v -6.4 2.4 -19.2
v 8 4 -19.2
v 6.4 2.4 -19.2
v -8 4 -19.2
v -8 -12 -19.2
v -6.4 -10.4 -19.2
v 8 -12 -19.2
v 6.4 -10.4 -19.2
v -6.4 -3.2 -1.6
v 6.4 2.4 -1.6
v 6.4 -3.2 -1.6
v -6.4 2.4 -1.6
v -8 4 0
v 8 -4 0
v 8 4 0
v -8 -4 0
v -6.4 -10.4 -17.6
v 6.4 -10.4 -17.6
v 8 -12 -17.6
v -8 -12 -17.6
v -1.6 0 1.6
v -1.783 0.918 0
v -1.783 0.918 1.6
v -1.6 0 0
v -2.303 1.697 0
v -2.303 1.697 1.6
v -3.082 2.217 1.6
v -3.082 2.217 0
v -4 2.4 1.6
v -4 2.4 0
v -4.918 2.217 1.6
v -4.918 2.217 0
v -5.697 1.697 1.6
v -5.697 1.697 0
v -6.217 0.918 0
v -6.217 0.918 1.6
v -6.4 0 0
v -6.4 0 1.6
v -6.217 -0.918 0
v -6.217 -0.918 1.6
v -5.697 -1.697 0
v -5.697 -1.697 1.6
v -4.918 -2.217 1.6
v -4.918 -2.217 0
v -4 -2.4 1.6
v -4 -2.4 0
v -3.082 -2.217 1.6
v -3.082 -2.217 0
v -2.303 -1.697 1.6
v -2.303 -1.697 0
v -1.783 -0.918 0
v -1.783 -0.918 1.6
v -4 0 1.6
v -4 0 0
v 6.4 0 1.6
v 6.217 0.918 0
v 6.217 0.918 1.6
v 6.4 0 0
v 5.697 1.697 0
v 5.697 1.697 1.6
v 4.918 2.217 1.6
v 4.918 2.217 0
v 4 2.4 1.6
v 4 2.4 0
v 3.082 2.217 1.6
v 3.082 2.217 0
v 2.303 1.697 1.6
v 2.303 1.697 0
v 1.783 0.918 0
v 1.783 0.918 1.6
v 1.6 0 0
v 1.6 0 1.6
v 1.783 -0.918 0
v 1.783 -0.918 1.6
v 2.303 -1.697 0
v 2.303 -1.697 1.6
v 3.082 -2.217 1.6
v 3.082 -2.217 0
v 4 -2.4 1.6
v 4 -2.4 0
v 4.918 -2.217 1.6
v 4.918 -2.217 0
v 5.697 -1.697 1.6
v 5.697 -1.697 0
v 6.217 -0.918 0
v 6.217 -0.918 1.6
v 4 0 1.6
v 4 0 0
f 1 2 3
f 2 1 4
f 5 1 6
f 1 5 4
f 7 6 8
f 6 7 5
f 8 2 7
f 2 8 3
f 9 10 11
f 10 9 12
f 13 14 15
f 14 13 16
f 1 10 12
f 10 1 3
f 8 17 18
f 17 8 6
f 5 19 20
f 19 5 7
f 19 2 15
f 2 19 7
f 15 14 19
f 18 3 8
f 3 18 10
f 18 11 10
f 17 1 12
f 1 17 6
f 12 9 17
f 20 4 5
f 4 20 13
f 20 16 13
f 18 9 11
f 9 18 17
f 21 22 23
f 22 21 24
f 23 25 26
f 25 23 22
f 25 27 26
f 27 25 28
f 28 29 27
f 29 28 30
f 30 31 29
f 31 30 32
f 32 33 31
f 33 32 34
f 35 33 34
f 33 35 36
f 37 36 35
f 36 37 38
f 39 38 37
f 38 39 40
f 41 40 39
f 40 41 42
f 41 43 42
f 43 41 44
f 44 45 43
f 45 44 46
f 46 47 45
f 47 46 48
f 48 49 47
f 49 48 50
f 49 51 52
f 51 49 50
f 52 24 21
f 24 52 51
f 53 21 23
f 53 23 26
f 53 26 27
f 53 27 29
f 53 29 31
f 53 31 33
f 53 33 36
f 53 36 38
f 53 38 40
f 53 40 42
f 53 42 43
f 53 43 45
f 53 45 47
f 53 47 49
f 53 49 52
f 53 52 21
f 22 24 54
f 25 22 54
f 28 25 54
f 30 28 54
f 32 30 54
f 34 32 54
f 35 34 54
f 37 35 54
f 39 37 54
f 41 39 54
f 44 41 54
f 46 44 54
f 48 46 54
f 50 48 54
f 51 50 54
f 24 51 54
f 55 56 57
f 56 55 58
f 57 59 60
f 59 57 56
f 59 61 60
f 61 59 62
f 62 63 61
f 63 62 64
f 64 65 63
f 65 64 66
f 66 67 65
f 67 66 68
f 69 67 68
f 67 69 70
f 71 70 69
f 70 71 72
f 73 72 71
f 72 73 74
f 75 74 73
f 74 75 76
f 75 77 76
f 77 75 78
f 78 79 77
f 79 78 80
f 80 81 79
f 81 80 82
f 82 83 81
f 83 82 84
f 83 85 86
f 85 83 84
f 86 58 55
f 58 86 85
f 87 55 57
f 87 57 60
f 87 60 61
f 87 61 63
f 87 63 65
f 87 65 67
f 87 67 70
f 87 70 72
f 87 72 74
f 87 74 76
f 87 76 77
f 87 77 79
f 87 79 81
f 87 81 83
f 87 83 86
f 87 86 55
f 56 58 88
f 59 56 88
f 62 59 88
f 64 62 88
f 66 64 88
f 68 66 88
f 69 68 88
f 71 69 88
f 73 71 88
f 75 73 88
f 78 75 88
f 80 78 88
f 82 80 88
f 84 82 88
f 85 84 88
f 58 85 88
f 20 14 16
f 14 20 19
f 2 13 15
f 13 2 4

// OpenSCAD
// file: ../p/4-4edge.scad
use <../lib.scad>
function ldraw_lib__4_4edge() = [
// 0 Circle 1.0
// 0 Name: 4-4edge.dat
// 0 Author: James Jessiman
// 0 !LDRAW_ORG Primitive UPDATE 2017-01
// 0 !LICENSE Licensed under CC BY 2.0 and CC BY 4.0 : see CAreadme.txt
// 
// 0 BFC CERTIFY CCW
  [0,"BFC","CERTIFY"],
  [0,"BFC","CCW"],
// 
// 0 !HISTORY 1998-12-15 [PTadmin] Official Update 1998-10
// 0 !HISTORY 2005-12-28 [PTadmin] Official Update 2005-01
// 0 !HISTORY 2007-06-24 [PTadmin] Header formatted for Contributor Agreement
// 0 !HISTORY 2008-07-01 [PTadmin] Official Update 2008-01
// 0 !HISTORY 2017-01-15 [Steffen] BFCed
// 0 !HISTORY 2017-12-30 [PTadmin] Official Update 2017-01
// 
// 
// 2 24 1 0 0 0.9239 0 0.3827
  [2,24,1,0,0,0.9239,0,0.3827],
// 2 24 0.9239 0 0.3827 0.7071 0 0.7071
  [2,24,0.9239,0,0.3827,0.7071,0,0.7071],
// 2 24 0.7071 0 0.7071 0.3827 0 0.9239
  [2,24,0.7071,0,0.7071,0.3827,0,0.9239],
// 2 24 0.3827 0 0.9239 0 0 1
  [2,24,0.3827,0,0.9239,0,0,1],
// 2 24 0 0 1 -0.3827 0 0.9239
  [2,24,0,0,1,-0.3827,0,0.9239],
// 2 24 -0.3827 0 0.9239 -0.7071 0 0.7071
  [2,24,-0.3827,0,0.9239,-0.7071,0,0.7071],
// 2 24 -0.7071 0 0.7071 -0.9239 0 0.3827
  [2,24,-0.7071,0,0.7071,-0.9239,0,0.3827],
// 2 24 -0.9239 0 0.3827 -1 0 -0
  [2,24,-0.9239,0,0.3827,-1,0,-0],
// 2 24 -1 0 -0 -0.9239 0 -0.3827
  [2,24,-1,0,-0,-0.9239,0,-0.3827],
// 2 24 -0.9239 0 -0.3827 -0.7071 0 -0.7071
  [2,24,-0.9239,0,-0.3827,-0.7071,0,-0.7071],
// 2 24 -0.7071 0 -0.7071 -0.3827 0 -0.9239
  [2,24,-0.7071,0,-0.7071,-0.3827,0,-0.9239],
// 2 24 -0.3827 0 -0.9239 0 0 -1
  [2,24,-0.3827,0,-0.9239,0,0,-1],
// 2 24 0 0 -1 0.3827 0 -0.9239
  [2,24,0,0,-1,0.3827,0,-0.9239],
// 2 24 0.3827 0 -0.9239 0.7071 0 -0.7071
  [2,24,0.3827,0,-0.9239,0.7071,0,-0.7071],
// 2 24 0.7071 0 -0.7071 0.9239 0 -0.3827
  [2,24,0.7071,0,-0.7071,0.9239,0,-0.3827],
// 2 24 0.9239 0 -0.3827 1 0 0
  [2,24,0.9239,0,-0.3827,1,0,0],
];
module ldraw_lib__4_4edge(step=0, col=false, unit=2/5, alt=false, line=0.2, solid=!$preview)
    makepoly(ldraw_lib__4_4edge(), step=step, col=col, unit=unit, alt=alt, line=line, solid=solid);
ldraw_lib__4_4edge(line=0.2);
// file: ../p/4-4disc.scad
use <../lib.scad>
function ldraw_lib__4_4disc() = [
// 0 Disc 1.0
// 0 Name: 4-4disc.dat
// 0 Author: James Jessiman
// 0 !LDRAW_ORG Primitive UPDATE 2002-02
// 0 !LICENSE Licensed under CC BY 2.0 and CC BY 4.0 : see CAreadme.txt
// 
// 0 BFC CERTIFY CCW
  [0,"BFC","CERTIFY"],
  [0,"BFC","CCW"],
// 
// 0 !HISTORY 1998-12-15 [PTadmin] Official Update 1998-10
// 0 !HISTORY 2002-03-23 [sbliss] Added BFC statement
// 0 !HISTORY 2002-04-25 [PTadmin] Official Update 2002-02
// 0 !HISTORY 2007-06-24 [PTadmin] Header formatted for Contributor Agreement
// 0 !HISTORY 2008-07-01 [PTadmin] Official Update 2008-01
// 
// 
// 3 16 0 0 0 1 0 0 0.9239 0 0.3827
  [3,16,0,0,0,1,0,0,0.9239,0,0.3827],
// 3 16 0 0 0 0.9239 0 0.3827 0.7071 0 0.7071
  [3,16,0,0,0,0.9239,0,0.3827,0.7071,0,0.7071],
// 3 16 0 0 0 0.7071 0 0.7071 0.3827 0 0.9239
  [3,16,0,0,0,0.7071,0,0.7071,0.3827,0,0.9239],
// 3 16 0 0 0 0.3827 0 0.9239 0 0 1
  [3,16,0,0,0,0.3827,0,0.9239,0,0,1],
// 3 16 0 0 0 0 0 1 -0.3827 0 0.9239
  [3,16,0,0,0,0,0,1,-0.3827,0,0.9239],
// 3 16 0 0 0 -0.3827 0 0.9239 -0.7071 0 0.7071
  [3,16,0,0,0,-0.3827,0,0.9239,-0.7071,0,0.7071],
// 3 16 0 0 0 -0.7071 0 0.7071 -0.9239 0 0.3827
  [3,16,0,0,0,-0.7071,0,0.7071,-0.9239,0,0.3827],
// 3 16 0 0 0 -0.9239 0 0.3827 -1 0 -0
  [3,16,0,0,0,-0.9239,0,0.3827,-1,0,-0],
// 3 16 0 0 0 -1 0 -0 -0.9239 0 -0.3827
  [3,16,0,0,0,-1,0,-0,-0.9239,0,-0.3827],
// 3 16 0 0 0 -0.9239 0 -0.3827 -0.7071 0 -0.7071
  [3,16,0,0,0,-0.9239,0,-0.3827,-0.7071,0,-0.7071],
// 3 16 0 0 0 -0.7071 0 -0.7071 -0.3827 0 -0.9239
  [3,16,0,0,0,-0.7071,0,-0.7071,-0.3827,0,-0.9239],
// 3 16 0 0 0 -0.3827 0 -0.9239 0 0 -1
  [3,16,0,0,0,-0.3827,0,-0.9239,0,0,-1],
// 3 16 0 0 0 0 0 -1 0.3827 0 -0.9239
  [3,16,0,0,0,0,0,-1,0.3827,0,-0.9239],
// 3 16 0 0 0 0.3827 0 -0.9239 0.7071 0 -0.7071
  [3,16,0,0,0,0.3827,0,-0.9239,0.7071,0,-0.7071],
// 3 16 0 0 0 0.7071 0 -0.7071 0.9239 0 -0.3827
  [3,16,0,0,0,0.7071,0,-0.7071,0.9239,0,-0.3827],
// 3 16 0 0 0 0.9239 0 -0.3827 1 0 0
  [3,16,0,0,0,0.9239,0,-0.3827,1,0,0],
// 0
];
module ldraw_lib__4_4disc(step=0, col=false, unit=2/5, alt=false, line=0.2, solid=!$preview)
    makepoly(ldraw_lib__4_4disc(), step=step, col=col, unit=unit, alt=alt, line=line, solid=solid);
ldraw_lib__4_4disc(line=0.2);
// file: ../p/4-4cyli.scad
use <../lib.scad>
$fa=1; $fs=0.2;
function ldraw_lib__4_4cyli(realsolid=false) = [
// 0 Cylinder 1.0
// 0 Name: 4-4cyli.dat
// 0 Author: James Jessiman
// 0 !LDRAW_ORG Primitive UPDATE 2005-01
// 0 !LICENSE Licensed under CC BY 2.0 and CC BY 4.0 : see CAreadme.txt
// 
// 0 BFC CERTIFY CCW
  [0,"BFC","CERTIFY"],
  [0,"BFC","CCW"],
// 
// 0 !HISTORY 1998-12-15 [PTadmin] Official Update 1998-10
// 0 !HISTORY 2002-03-23 [sbliss] Added BFC statement; merged headers from files in distributions LDraw 0.27 and Complete.
// 0 !HISTORY 2002-04-25 [PTadmin] Official Update 2002-02
// 0 !HISTORY 2004-12-14 [guyvivan] BFC CCW
// 0 !HISTORY 2005-12-28 [PTadmin] Official Update 2005-01
// 0 !HISTORY 2007-06-24 [PTadmin] Header formatted for Contributor Agreement
// 0 !HISTORY 2008-07-01 [PTadmin] Official Update 2008-01
// 
// 
// 4 16 1 1 0 0.9239 1 0.3827 0.9239 0 0.3827 1 0 0
  [4,16,1,1,0,0.9239,1,0.3827,0.9239,0,0.3827,1,0,0],
// 5 24 1 0 0 1 1 0 0.9239 0 0.3827 0.9239 0 -0.3827
  [5,24,1,0,0,1,1,0,0.9239,0,0.3827,0.9239,0,-0.3827],
// 4 16 0.9239 1 0.3827 0.7071 1 0.7071 0.7071 0 0.7071 0.9239 0 0.3827
  [4,16,0.9239,1,0.3827,0.7071,1,0.7071,0.7071,0,0.7071,0.9239,0,0.3827],
// 5 24 0.9239 0 0.3827 0.9239 1 0.3827 0.7071 0 0.7071 1 0 0
  [5,24,0.9239,0,0.3827,0.9239,1,0.3827,0.7071,0,0.7071,1,0,0],
// 4 16 0.7071 1 0.7071 0.3827 1 0.9239 0.3827 0 0.9239 0.7071 0 0.7071
  [4,16,0.7071,1,0.7071,0.3827,1,0.9239,0.3827,0,0.9239,0.7071,0,0.7071],
// 5 24 0.7071 0 0.7071 0.7071 1 0.7071 0.3827 0 0.9239 0.9239 0 0.3827
  [5,24,0.7071,0,0.7071,0.7071,1,0.7071,0.3827,0,0.9239,0.9239,0,0.3827],
// 4 16 0.3827 1 0.9239 0 1 1 0 0 1 0.3827 0 0.9239
  [4,16,0.3827,1,0.9239,0,1,1,0,0,1,0.3827,0,0.9239],
// 5 24 0.3827 0 0.9239 0.3827 1 0.9239 0 0 1 0.7071 0 0.7071
  [5,24,0.3827,0,0.9239,0.3827,1,0.9239,0,0,1,0.7071,0,0.7071],
// 4 16 0 1 1 -0.3827 1 0.9239 -0.3827 0 0.9239 0 0 1
  [4,16,0,1,1,-0.3827,1,0.9239,-0.3827,0,0.9239,0,0,1],
// 5 24 0 0 1 0 1 1 -0.3827 0 0.9239 0.3827 0 0.9239
  [5,24,0,0,1,0,1,1,-0.3827,0,0.9239,0.3827,0,0.9239],
// 4 16 -0.3827 1 0.9239 -0.7071 1 0.7071 -0.7071 0 0.7071 -0.3827 0 0.9239
  [4,16,-0.3827,1,0.9239,-0.7071,1,0.7071,-0.7071,0,0.7071,-0.3827,0,0.9239],
// 5 24 -0.3827 0 0.9239 -0.3827 1 0.9239 -0.7071 0 0.7071 0 0 1
  [5,24,-0.3827,0,0.9239,-0.3827,1,0.9239,-0.7071,0,0.7071,0,0,1],
// 4 16 -0.7071 1 0.7071 -0.9239 1 0.3827 -0.9239 0 0.3827 -0.7071 0 0.7071
  [4,16,-0.7071,1,0.7071,-0.9239,1,0.3827,-0.9239,0,0.3827,-0.7071,0,0.7071],
// 5 24 -0.7071 0 0.7071 -0.7071 1 0.7071 -0.9239 0 0.3827 -0.3827 0 0.9239
  [5,24,-0.7071,0,0.7071,-0.7071,1,0.7071,-0.9239,0,0.3827,-0.3827,0,0.9239],
// 4 16 -0.9239 1 0.3827 -1 1 0 -1 0 0 -0.9239 0 0.3827
  [4,16,-0.9239,1,0.3827,-1,1,0,-1,0,0,-0.9239,0,0.3827],
// 5 24 -0.9239 0 0.3827 -0.9239 1 0.3827 -1 0 0 -0.7071 0 0.7071
  [5,24,-0.9239,0,0.3827,-0.9239,1,0.3827,-1,0,0,-0.7071,0,0.7071],
// 4 16 -1 1 0 -0.9239 1 -0.3827 -0.9239 0 -0.3827 -1 0 0
  [4,16,-1,1,0,-0.9239,1,-0.3827,-0.9239,0,-0.3827,-1,0,0],
// 5 24 -1 0 0 -1 1 0 -0.9239 0 -0.3827 -0.9239 0 0.3827
  [5,24,-1,0,0,-1,1,0,-0.9239,0,-0.3827,-0.9239,0,0.3827],
// 4 16 -0.9239 1 -0.3827 -0.7071 1 -0.7071 -0.7071 0 -0.7071 -0.9239 0 -0.3827
  [4,16,-0.9239,1,-0.3827,-0.7071,1,-0.7071,-0.7071,0,-0.7071,-0.9239,0,-0.3827],
// 5 24 -0.9239 0 -0.3827 -0.9239 1 -0.3827 -0.7071 0 -0.7071 -1 0 0
  [5,24,-0.9239,0,-0.3827,-0.9239,1,-0.3827,-0.7071,0,-0.7071,-1,0,0],
// 4 16 -0.7071 1 -0.7071 -0.3827 1 -0.9239 -0.3827 0 -0.9239 -0.7071 0 -0.7071
  [4,16,-0.7071,1,-0.7071,-0.3827,1,-0.9239,-0.3827,0,-0.9239,-0.7071,0,-0.7071],
// 5 24 -0.7071 0 -0.7071 -0.7071 1 -0.7071 -0.3827 0 -0.9239 -0.9239 0 -0.3827
  [5,24,-0.7071,0,-0.7071,-0.7071,1,-0.7071,-0.3827,0,-0.9239,-0.9239,0,-0.3827],
// 4 16 -0.3827 1 -0.9239 0 1 -1 0 0 -1 -0.3827 0 -0.9239
  [4,16,-0.3827,1,-0.9239,0,1,-1,0,0,-1,-0.3827,0,-0.9239],
// 5 24 -0.3827 0 -0.9239 -0.3827 1 -0.9239 0 0 -1 -0.7071 0 -0.7071
  [5,24,-0.3827,0,-0.9239,-0.3827,1,-0.9239,0,0,-1,-0.7071,0,-0.7071],
// 4 16 0 1 -1 0.3827 1 -0.9239 0.3827 0 -0.9239 0 0 -1
  [4,16,0,1,-1,0.3827,1,-0.9239,0.3827,0,-0.9239,0,0,-1],
// 5 24 0 0 -1 0 1 -1 0.3827 0 -0.9239 -0.3827 0 -0.9239
  [5,24,0,0,-1,0,1,-1,0.3827,0,-0.9239,-0.3827,0,-0.9239],
// 4 16 0.3827 1 -0.9239 0.7071 1 -0.7071 0.7071 0 -0.7071 0.3827 0 -0.9239
  [4,16,0.3827,1,-0.9239,0.7071,1,-0.7071,0.7071,0,-0.7071,0.3827,0,-0.9239],
// 5 24 0.3827 0 -0.9239 0.3827 1 -0.9239 0.7071 0 -0.7071 0 0 -1
  [5,24,0.3827,0,-0.9239,0.3827,1,-0.9239,0.7071,0,-0.7071,0,0,-1],
// 4 16 0.7071 1 -0.7071 0.9239 1 -0.3827 0.9239 0 -0.3827 0.7071 0 -0.7071
  [4,16,0.7071,1,-0.7071,0.9239,1,-0.3827,0.9239,0,-0.3827,0.7071,0,-0.7071],
// 5 24 0.7071 0 -0.7071 0.7071 1 -0.7071 0.9239 0 -0.3827 0.3827 0 -0.9239
  [5,24,0.7071,0,-0.7071,0.7071,1,-0.7071,0.9239,0,-0.3827,0.3827,0,-0.9239],
// 4 16 0.9239 1 -0.3827 1 1 0 1 0 0 0.9239 0 -0.3827
  [4,16,0.9239,1,-0.3827,1,1,0,1,0,0,0.9239,0,-0.3827],
// 5 24 0.9239 0 -0.3827 0.9239 1 -0.3827 1 0 0 0.7071 0 -0.7071
  [5,24,0.9239,0,-0.3827,0.9239,1,-0.3827,1,0,0,0.7071,0,-0.7071],
// 0
];
module ldraw_lib__4_4cyli(step=0, col=false, unit=2/5, alt=false, line=0.2, solid=!$preview)
    makepoly(ldraw_lib__4_4cyli(solid), step=step, col=col, unit=unit, alt=alt, line=line, solid=solid);
ldraw_lib__4_4cyli(line=0.2);
// file: ../p/stud.scad
use <../lib.scad>
use <4-4cyli.scad>
use <4-4disc.scad>
use <4-4edge.scad>
function ldraw_lib__stud() = [
// 0 Stud
// 0 Name: stud.dat
// 0 Author: James Jessiman
// 0 !LDRAW_ORG Primitive UPDATE 2012-01
// 0 !LICENSE Licensed under CC BY 4.0 : see CAreadme.txt
// 
// 0 BFC CERTIFY CCW
  [0,"BFC","CERTIFY"],
  [0,"BFC","CCW"],
// 
// 0 !HISTORY 2002-04-04 [sbliss] Modified for BFC compliance
// 0 !HISTORY 2002-04-25 [PTadmin] Official Update 2002-02
// 0 !HISTORY 2007-06-24 [PTadmin] Header formatted for Contributor Agreement
// 0 !HISTORY 2008-07-01 [PTadmin] Official Update 2008-01
// 0 !HISTORY 2012-02-16 [Philo] Changed to CCW
// 0 !HISTORY 2012-03-30 [PTadmin] Official Update 2012-01
// 
// 
// 1 16 0 0 0 6 0 0 0 1 0 0 0 6 4-4edge.dat
  [1,16,0,0,0,6,0,0,0,1,0,0,0,6, ldraw_lib__4_4edge()],
// 1 16 0 -4 0 6 0 0 0 1 0 0 0 6 4-4edge.dat
  [1,16,0,-4,0,6,0,0,0,1,0,0,0,6, ldraw_lib__4_4edge()],
// 1 16 0 0 0 6 0 0 0 -4 0 0 0 6 4-4cyli.dat
  [1,16,0,0,0,6,0,0,0,-4,0,0,0,6, ldraw_lib__4_4cyli()],
// 1 16 0 -4 0 6 0 0 0 1 0 0 0 6 4-4disc.dat
  [1,16,0,-4,0,6,0,0,0,1,0,0,0,6, ldraw_lib__4_4disc()],
  [-1,16,0,0,0,6,0,0,0,-1,0,0,0,6, ldraw_lib__4_4disc()],
];
module ldraw_lib__stud(step=0, col=false, unit=2/5, alt=false, line=0.2, solid=!$preview)
    makepoly(ldraw_lib__stud(), step=step, col=col, unit=unit, alt=alt, line=line, solid=solid);
ldraw_lib__stud(line=0.2);
// file: s/3678as01.scad
use <../../lib.scad>
use <../../p/stud.scad>
$fa=1; $fs=0.2;
function ldraw_lib__s__3678as01(realsolid=false) = [
// 0 ~Slope Brick 65  2 x  2 x  2 w/o Centre Tube w/o Front and Back
// 0 Name: s\3678as01.dat
// 0 Author: Matt Schild [mschild]
// 0 !LDRAW_ORG Subpart UPDATE 2010-02
// 0 !LICENSE Licensed under CC BY 2.0 and CC BY 4.0 : see CAreadme.txt
// 
// 0 BFC CERTIFY CCW
  [0,"BFC","CERTIFY"],
  [0,"BFC","CCW"],
// 
// 0 !HISTORY 2002-06-21 [mschild] removed back (Z = 10) and slope faces
// 0 !HISTORY 2002-12-31 [PTadmin] Official Update 2002-06
// 0 !HISTORY 2003-09-22 [OrionP] BFC'd
// 0 !HISTORY 2004-04-22 [PTadmin] Official Update 2004-02
// 0 !HISTORY 2007-08-31 [PTadmin] Header formatted for Contributor Agreement
// 0 !HISTORY 2008-07-01 [PTadmin] Official Update 2008-01
// 0 !HISTORY 2010-05-08 [PTadmin] Renamed from s\3678s01
// 0 !HISTORY 2010-07-05 [PTadmin] Official Update 2010-02
// 
// 
// 0 // Uncomment for front shell
// 0 // 4 16 20 44 -30 20 0 -10 -20 0 -10 -20 44 -30
// 0 // Uncomment for back shell
// 0 // 4 16 20 48 10 20 0 10 -20 0 10 -20 48 10
// 
// 2 24 16 48 6 -16 48 6
  [2,24,16,48,6,-16,48,6],
// 2 24 -16 48 6 -16 48 -26
  [2,24,-16,48,6,-16,48,-26],
// 2 24 -16 48 -26 16 48 -26
  [2,24,-16,48,-26,16,48,-26],
// 2 24 16 48 -26 16 48 6
  [2,24,16,48,-26,16,48,6],
// 2 24 20 48 10 -20 48 10
  [2,24,20,48,10,-20,48,10],
// 2 24 -20 48 10 -20 48 -30
  [2,24,-20,48,10,-20,48,-30],
// 2 24 -20 48 -30 20 48 -30
  [2,24,-20,48,-30,20,48,-30],
// 2 24 20 48 -30 20 48 10
  [2,24,20,48,-30,20,48,10],
// 2 24 16 48 6 16 4 6
  [2,24,16,48,6,16,4,6],
// 2 24 -16 48 6 -16 4 6
  [2,24,-16,48,6,-16,4,6],
// 2 24 16 48 -26 16 44 -26
  [2,24,16,48,-26,16,44,-26],
// 2 24 -16 48 -26 -16 44 -26
  [2,24,-16,48,-26,-16,44,-26],
// 2 24 16 4 6 -16 4 6
  [2,24,16,4,6,-16,4,6],
// 2 24 16 4 -8 -16 4 -8
  [2,24,16,4,-8,-16,4,-8],
// 2 24 16 44 -26 -16 44 -26
  [2,24,16,44,-26,-16,44,-26],
// 2 24 16 4 6 16 4 -8
  [2,24,16,4,6,16,4,-8],
// 2 24 -16 4 6 -16 4 -8
  [2,24,-16,4,6,-16,4,-8],
// 2 24 16 44 -26 16 4 -8
  [2,24,16,44,-26,16,4,-8],
// 2 24 -16 44 -26 -16 4 -8
  [2,24,-16,44,-26,-16,4,-8],
// 2 24 20 48 10 20 0 10
  [2,24,20,48,10,20,0,10],
// 2 24 -20 48 10 -20 0 10
  [2,24,-20,48,10,-20,0,10],
// 2 24 20 48 -30 20 44 -30
  [2,24,20,48,-30,20,44,-30],
// 2 24 -20 48 -30 -20 44 -30
  [2,24,-20,48,-30,-20,44,-30],
// 2 24 20 0 10 -20 0 10
  [2,24,20,0,10,-20,0,10],
// 2 24 20 0 -10 -20 0 -10
  [2,24,20,0,-10,-20,0,-10],
// 2 24 20 44 -30 -20 44 -30
  [2,24,20,44,-30,-20,44,-30],
// 2 24 20 0 10 20 0 -10
  [2,24,20,0,10,20,0,-10],
// 2 24 -20 0 10 -20 0 -10
  [2,24,-20,0,10,-20,0,-10],
// 2 24 20 44 -30 20 0 -10
  [2,24,20,44,-30,20,0,-10],
// 2 24 -20 44 -30 -20 0 -10
  [2,24,-20,44,-30,-20,0,-10],
// 4 16 20 48 10 16 48 6 -16 48 6 -20 48 10
  [4,16,20,48,10,16,48,6,-16,48,6,-20,48,10],
// 4 16 -20 48 10 -16 48 6 -16 48 -26 -20 48 -30
  [4,16,-20,48,10,-16,48,6,-16,48,-26,-20,48,-30],
// 4 16 -20 48 -30 -16 48 -26 16 48 -26 20 48 -30
  [4,16,-20,48,-30,-16,48,-26,16,48,-26,20,48,-30],
// 4 16 20 48 -30 16 48 -26 16 48 6 20 48 10
  [4,16,20,48,-30,16,48,-26,16,48,6,20,48,10],
// 4 16 16 4 6 16 4 -8 -16 4 -8 -16 4 6
  [4,16,16,4,6,16,4,-8,-16,4,-8,-16,4,6],
// 4 16 -20 0 10 -20 0 -10 20 0 -10 20 0 10
  [4,16,-20,0,10,-20,0,-10,20,0,-10,20,0,10],
// 4 16 16 48 6 16 4 6 -16 4 6 -16 48 6
  [4,16,16,48,6,16,4,6,-16,4,6,-16,48,6],
// 4 16 -16 48 -26 -16 44 -26 16 44 -26 16 48 -26
  [4,16,-16,48,-26,-16,44,-26,16,44,-26,16,48,-26],
// 4 16 20 48 -30 20 44 -30 -20 44 -30 -20 48 -30
  [4,16,20,48,-30,20,44,-30,-20,44,-30,-20,48,-30],
// 4 16 20 48 10 20 0 10 20 44 -30 20 48 -30
  [4,16,20,48,10,20,0,10,20,44,-30,20,48,-30],
// 3 16 20 0 10 20 0 -10 20 44 -30
  [3,16,20,0,10,20,0,-10,20,44,-30],
// 4 16 16 48 -26 16 44 -26 16 4 6 16 48 6
  [4,16,16,48,-26,16,44,-26,16,4,6,16,48,6],
// 3 16 16 44 -26 16 4 -8 16 4 6
  [3,16,16,44,-26,16,4,-8,16,4,6],
// 4 16 -16 48 6 -16 4 6 -16 44 -26 -16 48 -26
  [4,16,-16,48,6,-16,4,6,-16,44,-26,-16,48,-26],
// 3 16 -16 4 6 -16 4 -8 -16 44 -26
  [3,16,-16,4,6,-16,4,-8,-16,44,-26],
// 4 16 -20 48 -30 -20 44 -30 -20 0 10 -20 48 10
  [4,16,-20,48,-30,-20,44,-30,-20,0,10,-20,48,10],
// 3 16 -20 44 -30 -20 0 -10 -20 0 10
  [3,16,-20,44,-30,-20,0,-10,-20,0,10],
// 4 16 -16 44 -26 -16 4 -8 16 4 -8 16 44 -26
  [4,16,-16,44,-26,-16,4,-8,16,4,-8,16,44,-26],
// 1 16 -10 0 0 1 0 0 0 1 0 0 0 1 stud.dat
  [1,16,-10,0,0,1,0,0,0,1,0,0,0,1, ldraw_lib__stud(realsolid)],
// 1 16 10 0 0 1 0 0 0 1 0 0 0 1 stud.dat
  [1,16,10,0,0,1,0,0,0,1,0,0,0,1, ldraw_lib__stud(realsolid)],
// 0
];
module ldraw_lib__s__3678as01(step=0, col=false, unit=2/5, alt=false, line=0.2, solid=!$preview)
    makepoly(ldraw_lib__s__3678as01(solid), step=step, col=col, unit=unit, alt=alt, line=line, solid=solid);
ldraw_lib__s__3678as01(line=0.2);
// main file
use <../lib.scad>
use <s/3678as01.scad>
function ldraw_lib__3678a() = [
// 0 Slope Brick 65  2 x  2 x  2 without Centre Tube
// 0 Name: 3678a.dat
// 0 Author: James Jessiman
// 0 !LDRAW_ORG Part UPDATE 2010-02
// 0 !LICENSE Licensed under CC BY 4.0 : see CAreadme.txt
// 
// 0 BFC CERTIFY CCW
  [0,"BFC","CERTIFY"],
  [0,"BFC","CCW"],
// 
// 0 !PREVIEW 16 0 0 0 -1 0 0 0 1 0 0 0 -1
// 
// 0 !HISTORY 2002-12-31 [PTadmin] Official Update 2002-06
// 0 !HISTORY 2003-09-22 [fwcain] Used subfile...
// 0 !HISTORY 2004-04-22 [PTadmin] Official Update 2004-02
// 0 !HISTORY 2007-06-29 [PTadmin] Header formatted for Contributor Agreement
// 0 !HISTORY 2008-07-01 [PTadmin] Official Update 2008-01
// 0 !HISTORY 2010-05-08 [PTadmin] Renamed from 3678
// 0 !HISTORY 2010-07-05 [PTadmin] Official Update 2010-02
// 
// 
// 1 16 0 0 0 1 0 0 0 1 0 0 0 1 s\3678as01.dat
  [1,16,0,0,0,1,0,0,0,1,0,0,0,1, ldraw_lib__s__3678as01()],
// 0
// 4 16 20 44 -30 20 0 -10 -20 0 -10 -20 44 -30
  [4,16,20,44,-30,20,0,-10,-20,0,-10,-20,44,-30],
// 4 16 20 48 10 -20 48 10 -20 0 10 20 0 10
  [4,16,20,48,10,-20,48,10,-20,0,10,20,0,10],
// 0
];
module ldraw_lib__3678a(step=0, col=false, unit=2/5, alt=false, line=0.2, solid=!$preview)
    makepoly(ldraw_lib__3678a(), step=step, col=col, unit=unit, alt=alt, line=line, solid=solid);
ldraw_lib__3678a(line=0.2);
